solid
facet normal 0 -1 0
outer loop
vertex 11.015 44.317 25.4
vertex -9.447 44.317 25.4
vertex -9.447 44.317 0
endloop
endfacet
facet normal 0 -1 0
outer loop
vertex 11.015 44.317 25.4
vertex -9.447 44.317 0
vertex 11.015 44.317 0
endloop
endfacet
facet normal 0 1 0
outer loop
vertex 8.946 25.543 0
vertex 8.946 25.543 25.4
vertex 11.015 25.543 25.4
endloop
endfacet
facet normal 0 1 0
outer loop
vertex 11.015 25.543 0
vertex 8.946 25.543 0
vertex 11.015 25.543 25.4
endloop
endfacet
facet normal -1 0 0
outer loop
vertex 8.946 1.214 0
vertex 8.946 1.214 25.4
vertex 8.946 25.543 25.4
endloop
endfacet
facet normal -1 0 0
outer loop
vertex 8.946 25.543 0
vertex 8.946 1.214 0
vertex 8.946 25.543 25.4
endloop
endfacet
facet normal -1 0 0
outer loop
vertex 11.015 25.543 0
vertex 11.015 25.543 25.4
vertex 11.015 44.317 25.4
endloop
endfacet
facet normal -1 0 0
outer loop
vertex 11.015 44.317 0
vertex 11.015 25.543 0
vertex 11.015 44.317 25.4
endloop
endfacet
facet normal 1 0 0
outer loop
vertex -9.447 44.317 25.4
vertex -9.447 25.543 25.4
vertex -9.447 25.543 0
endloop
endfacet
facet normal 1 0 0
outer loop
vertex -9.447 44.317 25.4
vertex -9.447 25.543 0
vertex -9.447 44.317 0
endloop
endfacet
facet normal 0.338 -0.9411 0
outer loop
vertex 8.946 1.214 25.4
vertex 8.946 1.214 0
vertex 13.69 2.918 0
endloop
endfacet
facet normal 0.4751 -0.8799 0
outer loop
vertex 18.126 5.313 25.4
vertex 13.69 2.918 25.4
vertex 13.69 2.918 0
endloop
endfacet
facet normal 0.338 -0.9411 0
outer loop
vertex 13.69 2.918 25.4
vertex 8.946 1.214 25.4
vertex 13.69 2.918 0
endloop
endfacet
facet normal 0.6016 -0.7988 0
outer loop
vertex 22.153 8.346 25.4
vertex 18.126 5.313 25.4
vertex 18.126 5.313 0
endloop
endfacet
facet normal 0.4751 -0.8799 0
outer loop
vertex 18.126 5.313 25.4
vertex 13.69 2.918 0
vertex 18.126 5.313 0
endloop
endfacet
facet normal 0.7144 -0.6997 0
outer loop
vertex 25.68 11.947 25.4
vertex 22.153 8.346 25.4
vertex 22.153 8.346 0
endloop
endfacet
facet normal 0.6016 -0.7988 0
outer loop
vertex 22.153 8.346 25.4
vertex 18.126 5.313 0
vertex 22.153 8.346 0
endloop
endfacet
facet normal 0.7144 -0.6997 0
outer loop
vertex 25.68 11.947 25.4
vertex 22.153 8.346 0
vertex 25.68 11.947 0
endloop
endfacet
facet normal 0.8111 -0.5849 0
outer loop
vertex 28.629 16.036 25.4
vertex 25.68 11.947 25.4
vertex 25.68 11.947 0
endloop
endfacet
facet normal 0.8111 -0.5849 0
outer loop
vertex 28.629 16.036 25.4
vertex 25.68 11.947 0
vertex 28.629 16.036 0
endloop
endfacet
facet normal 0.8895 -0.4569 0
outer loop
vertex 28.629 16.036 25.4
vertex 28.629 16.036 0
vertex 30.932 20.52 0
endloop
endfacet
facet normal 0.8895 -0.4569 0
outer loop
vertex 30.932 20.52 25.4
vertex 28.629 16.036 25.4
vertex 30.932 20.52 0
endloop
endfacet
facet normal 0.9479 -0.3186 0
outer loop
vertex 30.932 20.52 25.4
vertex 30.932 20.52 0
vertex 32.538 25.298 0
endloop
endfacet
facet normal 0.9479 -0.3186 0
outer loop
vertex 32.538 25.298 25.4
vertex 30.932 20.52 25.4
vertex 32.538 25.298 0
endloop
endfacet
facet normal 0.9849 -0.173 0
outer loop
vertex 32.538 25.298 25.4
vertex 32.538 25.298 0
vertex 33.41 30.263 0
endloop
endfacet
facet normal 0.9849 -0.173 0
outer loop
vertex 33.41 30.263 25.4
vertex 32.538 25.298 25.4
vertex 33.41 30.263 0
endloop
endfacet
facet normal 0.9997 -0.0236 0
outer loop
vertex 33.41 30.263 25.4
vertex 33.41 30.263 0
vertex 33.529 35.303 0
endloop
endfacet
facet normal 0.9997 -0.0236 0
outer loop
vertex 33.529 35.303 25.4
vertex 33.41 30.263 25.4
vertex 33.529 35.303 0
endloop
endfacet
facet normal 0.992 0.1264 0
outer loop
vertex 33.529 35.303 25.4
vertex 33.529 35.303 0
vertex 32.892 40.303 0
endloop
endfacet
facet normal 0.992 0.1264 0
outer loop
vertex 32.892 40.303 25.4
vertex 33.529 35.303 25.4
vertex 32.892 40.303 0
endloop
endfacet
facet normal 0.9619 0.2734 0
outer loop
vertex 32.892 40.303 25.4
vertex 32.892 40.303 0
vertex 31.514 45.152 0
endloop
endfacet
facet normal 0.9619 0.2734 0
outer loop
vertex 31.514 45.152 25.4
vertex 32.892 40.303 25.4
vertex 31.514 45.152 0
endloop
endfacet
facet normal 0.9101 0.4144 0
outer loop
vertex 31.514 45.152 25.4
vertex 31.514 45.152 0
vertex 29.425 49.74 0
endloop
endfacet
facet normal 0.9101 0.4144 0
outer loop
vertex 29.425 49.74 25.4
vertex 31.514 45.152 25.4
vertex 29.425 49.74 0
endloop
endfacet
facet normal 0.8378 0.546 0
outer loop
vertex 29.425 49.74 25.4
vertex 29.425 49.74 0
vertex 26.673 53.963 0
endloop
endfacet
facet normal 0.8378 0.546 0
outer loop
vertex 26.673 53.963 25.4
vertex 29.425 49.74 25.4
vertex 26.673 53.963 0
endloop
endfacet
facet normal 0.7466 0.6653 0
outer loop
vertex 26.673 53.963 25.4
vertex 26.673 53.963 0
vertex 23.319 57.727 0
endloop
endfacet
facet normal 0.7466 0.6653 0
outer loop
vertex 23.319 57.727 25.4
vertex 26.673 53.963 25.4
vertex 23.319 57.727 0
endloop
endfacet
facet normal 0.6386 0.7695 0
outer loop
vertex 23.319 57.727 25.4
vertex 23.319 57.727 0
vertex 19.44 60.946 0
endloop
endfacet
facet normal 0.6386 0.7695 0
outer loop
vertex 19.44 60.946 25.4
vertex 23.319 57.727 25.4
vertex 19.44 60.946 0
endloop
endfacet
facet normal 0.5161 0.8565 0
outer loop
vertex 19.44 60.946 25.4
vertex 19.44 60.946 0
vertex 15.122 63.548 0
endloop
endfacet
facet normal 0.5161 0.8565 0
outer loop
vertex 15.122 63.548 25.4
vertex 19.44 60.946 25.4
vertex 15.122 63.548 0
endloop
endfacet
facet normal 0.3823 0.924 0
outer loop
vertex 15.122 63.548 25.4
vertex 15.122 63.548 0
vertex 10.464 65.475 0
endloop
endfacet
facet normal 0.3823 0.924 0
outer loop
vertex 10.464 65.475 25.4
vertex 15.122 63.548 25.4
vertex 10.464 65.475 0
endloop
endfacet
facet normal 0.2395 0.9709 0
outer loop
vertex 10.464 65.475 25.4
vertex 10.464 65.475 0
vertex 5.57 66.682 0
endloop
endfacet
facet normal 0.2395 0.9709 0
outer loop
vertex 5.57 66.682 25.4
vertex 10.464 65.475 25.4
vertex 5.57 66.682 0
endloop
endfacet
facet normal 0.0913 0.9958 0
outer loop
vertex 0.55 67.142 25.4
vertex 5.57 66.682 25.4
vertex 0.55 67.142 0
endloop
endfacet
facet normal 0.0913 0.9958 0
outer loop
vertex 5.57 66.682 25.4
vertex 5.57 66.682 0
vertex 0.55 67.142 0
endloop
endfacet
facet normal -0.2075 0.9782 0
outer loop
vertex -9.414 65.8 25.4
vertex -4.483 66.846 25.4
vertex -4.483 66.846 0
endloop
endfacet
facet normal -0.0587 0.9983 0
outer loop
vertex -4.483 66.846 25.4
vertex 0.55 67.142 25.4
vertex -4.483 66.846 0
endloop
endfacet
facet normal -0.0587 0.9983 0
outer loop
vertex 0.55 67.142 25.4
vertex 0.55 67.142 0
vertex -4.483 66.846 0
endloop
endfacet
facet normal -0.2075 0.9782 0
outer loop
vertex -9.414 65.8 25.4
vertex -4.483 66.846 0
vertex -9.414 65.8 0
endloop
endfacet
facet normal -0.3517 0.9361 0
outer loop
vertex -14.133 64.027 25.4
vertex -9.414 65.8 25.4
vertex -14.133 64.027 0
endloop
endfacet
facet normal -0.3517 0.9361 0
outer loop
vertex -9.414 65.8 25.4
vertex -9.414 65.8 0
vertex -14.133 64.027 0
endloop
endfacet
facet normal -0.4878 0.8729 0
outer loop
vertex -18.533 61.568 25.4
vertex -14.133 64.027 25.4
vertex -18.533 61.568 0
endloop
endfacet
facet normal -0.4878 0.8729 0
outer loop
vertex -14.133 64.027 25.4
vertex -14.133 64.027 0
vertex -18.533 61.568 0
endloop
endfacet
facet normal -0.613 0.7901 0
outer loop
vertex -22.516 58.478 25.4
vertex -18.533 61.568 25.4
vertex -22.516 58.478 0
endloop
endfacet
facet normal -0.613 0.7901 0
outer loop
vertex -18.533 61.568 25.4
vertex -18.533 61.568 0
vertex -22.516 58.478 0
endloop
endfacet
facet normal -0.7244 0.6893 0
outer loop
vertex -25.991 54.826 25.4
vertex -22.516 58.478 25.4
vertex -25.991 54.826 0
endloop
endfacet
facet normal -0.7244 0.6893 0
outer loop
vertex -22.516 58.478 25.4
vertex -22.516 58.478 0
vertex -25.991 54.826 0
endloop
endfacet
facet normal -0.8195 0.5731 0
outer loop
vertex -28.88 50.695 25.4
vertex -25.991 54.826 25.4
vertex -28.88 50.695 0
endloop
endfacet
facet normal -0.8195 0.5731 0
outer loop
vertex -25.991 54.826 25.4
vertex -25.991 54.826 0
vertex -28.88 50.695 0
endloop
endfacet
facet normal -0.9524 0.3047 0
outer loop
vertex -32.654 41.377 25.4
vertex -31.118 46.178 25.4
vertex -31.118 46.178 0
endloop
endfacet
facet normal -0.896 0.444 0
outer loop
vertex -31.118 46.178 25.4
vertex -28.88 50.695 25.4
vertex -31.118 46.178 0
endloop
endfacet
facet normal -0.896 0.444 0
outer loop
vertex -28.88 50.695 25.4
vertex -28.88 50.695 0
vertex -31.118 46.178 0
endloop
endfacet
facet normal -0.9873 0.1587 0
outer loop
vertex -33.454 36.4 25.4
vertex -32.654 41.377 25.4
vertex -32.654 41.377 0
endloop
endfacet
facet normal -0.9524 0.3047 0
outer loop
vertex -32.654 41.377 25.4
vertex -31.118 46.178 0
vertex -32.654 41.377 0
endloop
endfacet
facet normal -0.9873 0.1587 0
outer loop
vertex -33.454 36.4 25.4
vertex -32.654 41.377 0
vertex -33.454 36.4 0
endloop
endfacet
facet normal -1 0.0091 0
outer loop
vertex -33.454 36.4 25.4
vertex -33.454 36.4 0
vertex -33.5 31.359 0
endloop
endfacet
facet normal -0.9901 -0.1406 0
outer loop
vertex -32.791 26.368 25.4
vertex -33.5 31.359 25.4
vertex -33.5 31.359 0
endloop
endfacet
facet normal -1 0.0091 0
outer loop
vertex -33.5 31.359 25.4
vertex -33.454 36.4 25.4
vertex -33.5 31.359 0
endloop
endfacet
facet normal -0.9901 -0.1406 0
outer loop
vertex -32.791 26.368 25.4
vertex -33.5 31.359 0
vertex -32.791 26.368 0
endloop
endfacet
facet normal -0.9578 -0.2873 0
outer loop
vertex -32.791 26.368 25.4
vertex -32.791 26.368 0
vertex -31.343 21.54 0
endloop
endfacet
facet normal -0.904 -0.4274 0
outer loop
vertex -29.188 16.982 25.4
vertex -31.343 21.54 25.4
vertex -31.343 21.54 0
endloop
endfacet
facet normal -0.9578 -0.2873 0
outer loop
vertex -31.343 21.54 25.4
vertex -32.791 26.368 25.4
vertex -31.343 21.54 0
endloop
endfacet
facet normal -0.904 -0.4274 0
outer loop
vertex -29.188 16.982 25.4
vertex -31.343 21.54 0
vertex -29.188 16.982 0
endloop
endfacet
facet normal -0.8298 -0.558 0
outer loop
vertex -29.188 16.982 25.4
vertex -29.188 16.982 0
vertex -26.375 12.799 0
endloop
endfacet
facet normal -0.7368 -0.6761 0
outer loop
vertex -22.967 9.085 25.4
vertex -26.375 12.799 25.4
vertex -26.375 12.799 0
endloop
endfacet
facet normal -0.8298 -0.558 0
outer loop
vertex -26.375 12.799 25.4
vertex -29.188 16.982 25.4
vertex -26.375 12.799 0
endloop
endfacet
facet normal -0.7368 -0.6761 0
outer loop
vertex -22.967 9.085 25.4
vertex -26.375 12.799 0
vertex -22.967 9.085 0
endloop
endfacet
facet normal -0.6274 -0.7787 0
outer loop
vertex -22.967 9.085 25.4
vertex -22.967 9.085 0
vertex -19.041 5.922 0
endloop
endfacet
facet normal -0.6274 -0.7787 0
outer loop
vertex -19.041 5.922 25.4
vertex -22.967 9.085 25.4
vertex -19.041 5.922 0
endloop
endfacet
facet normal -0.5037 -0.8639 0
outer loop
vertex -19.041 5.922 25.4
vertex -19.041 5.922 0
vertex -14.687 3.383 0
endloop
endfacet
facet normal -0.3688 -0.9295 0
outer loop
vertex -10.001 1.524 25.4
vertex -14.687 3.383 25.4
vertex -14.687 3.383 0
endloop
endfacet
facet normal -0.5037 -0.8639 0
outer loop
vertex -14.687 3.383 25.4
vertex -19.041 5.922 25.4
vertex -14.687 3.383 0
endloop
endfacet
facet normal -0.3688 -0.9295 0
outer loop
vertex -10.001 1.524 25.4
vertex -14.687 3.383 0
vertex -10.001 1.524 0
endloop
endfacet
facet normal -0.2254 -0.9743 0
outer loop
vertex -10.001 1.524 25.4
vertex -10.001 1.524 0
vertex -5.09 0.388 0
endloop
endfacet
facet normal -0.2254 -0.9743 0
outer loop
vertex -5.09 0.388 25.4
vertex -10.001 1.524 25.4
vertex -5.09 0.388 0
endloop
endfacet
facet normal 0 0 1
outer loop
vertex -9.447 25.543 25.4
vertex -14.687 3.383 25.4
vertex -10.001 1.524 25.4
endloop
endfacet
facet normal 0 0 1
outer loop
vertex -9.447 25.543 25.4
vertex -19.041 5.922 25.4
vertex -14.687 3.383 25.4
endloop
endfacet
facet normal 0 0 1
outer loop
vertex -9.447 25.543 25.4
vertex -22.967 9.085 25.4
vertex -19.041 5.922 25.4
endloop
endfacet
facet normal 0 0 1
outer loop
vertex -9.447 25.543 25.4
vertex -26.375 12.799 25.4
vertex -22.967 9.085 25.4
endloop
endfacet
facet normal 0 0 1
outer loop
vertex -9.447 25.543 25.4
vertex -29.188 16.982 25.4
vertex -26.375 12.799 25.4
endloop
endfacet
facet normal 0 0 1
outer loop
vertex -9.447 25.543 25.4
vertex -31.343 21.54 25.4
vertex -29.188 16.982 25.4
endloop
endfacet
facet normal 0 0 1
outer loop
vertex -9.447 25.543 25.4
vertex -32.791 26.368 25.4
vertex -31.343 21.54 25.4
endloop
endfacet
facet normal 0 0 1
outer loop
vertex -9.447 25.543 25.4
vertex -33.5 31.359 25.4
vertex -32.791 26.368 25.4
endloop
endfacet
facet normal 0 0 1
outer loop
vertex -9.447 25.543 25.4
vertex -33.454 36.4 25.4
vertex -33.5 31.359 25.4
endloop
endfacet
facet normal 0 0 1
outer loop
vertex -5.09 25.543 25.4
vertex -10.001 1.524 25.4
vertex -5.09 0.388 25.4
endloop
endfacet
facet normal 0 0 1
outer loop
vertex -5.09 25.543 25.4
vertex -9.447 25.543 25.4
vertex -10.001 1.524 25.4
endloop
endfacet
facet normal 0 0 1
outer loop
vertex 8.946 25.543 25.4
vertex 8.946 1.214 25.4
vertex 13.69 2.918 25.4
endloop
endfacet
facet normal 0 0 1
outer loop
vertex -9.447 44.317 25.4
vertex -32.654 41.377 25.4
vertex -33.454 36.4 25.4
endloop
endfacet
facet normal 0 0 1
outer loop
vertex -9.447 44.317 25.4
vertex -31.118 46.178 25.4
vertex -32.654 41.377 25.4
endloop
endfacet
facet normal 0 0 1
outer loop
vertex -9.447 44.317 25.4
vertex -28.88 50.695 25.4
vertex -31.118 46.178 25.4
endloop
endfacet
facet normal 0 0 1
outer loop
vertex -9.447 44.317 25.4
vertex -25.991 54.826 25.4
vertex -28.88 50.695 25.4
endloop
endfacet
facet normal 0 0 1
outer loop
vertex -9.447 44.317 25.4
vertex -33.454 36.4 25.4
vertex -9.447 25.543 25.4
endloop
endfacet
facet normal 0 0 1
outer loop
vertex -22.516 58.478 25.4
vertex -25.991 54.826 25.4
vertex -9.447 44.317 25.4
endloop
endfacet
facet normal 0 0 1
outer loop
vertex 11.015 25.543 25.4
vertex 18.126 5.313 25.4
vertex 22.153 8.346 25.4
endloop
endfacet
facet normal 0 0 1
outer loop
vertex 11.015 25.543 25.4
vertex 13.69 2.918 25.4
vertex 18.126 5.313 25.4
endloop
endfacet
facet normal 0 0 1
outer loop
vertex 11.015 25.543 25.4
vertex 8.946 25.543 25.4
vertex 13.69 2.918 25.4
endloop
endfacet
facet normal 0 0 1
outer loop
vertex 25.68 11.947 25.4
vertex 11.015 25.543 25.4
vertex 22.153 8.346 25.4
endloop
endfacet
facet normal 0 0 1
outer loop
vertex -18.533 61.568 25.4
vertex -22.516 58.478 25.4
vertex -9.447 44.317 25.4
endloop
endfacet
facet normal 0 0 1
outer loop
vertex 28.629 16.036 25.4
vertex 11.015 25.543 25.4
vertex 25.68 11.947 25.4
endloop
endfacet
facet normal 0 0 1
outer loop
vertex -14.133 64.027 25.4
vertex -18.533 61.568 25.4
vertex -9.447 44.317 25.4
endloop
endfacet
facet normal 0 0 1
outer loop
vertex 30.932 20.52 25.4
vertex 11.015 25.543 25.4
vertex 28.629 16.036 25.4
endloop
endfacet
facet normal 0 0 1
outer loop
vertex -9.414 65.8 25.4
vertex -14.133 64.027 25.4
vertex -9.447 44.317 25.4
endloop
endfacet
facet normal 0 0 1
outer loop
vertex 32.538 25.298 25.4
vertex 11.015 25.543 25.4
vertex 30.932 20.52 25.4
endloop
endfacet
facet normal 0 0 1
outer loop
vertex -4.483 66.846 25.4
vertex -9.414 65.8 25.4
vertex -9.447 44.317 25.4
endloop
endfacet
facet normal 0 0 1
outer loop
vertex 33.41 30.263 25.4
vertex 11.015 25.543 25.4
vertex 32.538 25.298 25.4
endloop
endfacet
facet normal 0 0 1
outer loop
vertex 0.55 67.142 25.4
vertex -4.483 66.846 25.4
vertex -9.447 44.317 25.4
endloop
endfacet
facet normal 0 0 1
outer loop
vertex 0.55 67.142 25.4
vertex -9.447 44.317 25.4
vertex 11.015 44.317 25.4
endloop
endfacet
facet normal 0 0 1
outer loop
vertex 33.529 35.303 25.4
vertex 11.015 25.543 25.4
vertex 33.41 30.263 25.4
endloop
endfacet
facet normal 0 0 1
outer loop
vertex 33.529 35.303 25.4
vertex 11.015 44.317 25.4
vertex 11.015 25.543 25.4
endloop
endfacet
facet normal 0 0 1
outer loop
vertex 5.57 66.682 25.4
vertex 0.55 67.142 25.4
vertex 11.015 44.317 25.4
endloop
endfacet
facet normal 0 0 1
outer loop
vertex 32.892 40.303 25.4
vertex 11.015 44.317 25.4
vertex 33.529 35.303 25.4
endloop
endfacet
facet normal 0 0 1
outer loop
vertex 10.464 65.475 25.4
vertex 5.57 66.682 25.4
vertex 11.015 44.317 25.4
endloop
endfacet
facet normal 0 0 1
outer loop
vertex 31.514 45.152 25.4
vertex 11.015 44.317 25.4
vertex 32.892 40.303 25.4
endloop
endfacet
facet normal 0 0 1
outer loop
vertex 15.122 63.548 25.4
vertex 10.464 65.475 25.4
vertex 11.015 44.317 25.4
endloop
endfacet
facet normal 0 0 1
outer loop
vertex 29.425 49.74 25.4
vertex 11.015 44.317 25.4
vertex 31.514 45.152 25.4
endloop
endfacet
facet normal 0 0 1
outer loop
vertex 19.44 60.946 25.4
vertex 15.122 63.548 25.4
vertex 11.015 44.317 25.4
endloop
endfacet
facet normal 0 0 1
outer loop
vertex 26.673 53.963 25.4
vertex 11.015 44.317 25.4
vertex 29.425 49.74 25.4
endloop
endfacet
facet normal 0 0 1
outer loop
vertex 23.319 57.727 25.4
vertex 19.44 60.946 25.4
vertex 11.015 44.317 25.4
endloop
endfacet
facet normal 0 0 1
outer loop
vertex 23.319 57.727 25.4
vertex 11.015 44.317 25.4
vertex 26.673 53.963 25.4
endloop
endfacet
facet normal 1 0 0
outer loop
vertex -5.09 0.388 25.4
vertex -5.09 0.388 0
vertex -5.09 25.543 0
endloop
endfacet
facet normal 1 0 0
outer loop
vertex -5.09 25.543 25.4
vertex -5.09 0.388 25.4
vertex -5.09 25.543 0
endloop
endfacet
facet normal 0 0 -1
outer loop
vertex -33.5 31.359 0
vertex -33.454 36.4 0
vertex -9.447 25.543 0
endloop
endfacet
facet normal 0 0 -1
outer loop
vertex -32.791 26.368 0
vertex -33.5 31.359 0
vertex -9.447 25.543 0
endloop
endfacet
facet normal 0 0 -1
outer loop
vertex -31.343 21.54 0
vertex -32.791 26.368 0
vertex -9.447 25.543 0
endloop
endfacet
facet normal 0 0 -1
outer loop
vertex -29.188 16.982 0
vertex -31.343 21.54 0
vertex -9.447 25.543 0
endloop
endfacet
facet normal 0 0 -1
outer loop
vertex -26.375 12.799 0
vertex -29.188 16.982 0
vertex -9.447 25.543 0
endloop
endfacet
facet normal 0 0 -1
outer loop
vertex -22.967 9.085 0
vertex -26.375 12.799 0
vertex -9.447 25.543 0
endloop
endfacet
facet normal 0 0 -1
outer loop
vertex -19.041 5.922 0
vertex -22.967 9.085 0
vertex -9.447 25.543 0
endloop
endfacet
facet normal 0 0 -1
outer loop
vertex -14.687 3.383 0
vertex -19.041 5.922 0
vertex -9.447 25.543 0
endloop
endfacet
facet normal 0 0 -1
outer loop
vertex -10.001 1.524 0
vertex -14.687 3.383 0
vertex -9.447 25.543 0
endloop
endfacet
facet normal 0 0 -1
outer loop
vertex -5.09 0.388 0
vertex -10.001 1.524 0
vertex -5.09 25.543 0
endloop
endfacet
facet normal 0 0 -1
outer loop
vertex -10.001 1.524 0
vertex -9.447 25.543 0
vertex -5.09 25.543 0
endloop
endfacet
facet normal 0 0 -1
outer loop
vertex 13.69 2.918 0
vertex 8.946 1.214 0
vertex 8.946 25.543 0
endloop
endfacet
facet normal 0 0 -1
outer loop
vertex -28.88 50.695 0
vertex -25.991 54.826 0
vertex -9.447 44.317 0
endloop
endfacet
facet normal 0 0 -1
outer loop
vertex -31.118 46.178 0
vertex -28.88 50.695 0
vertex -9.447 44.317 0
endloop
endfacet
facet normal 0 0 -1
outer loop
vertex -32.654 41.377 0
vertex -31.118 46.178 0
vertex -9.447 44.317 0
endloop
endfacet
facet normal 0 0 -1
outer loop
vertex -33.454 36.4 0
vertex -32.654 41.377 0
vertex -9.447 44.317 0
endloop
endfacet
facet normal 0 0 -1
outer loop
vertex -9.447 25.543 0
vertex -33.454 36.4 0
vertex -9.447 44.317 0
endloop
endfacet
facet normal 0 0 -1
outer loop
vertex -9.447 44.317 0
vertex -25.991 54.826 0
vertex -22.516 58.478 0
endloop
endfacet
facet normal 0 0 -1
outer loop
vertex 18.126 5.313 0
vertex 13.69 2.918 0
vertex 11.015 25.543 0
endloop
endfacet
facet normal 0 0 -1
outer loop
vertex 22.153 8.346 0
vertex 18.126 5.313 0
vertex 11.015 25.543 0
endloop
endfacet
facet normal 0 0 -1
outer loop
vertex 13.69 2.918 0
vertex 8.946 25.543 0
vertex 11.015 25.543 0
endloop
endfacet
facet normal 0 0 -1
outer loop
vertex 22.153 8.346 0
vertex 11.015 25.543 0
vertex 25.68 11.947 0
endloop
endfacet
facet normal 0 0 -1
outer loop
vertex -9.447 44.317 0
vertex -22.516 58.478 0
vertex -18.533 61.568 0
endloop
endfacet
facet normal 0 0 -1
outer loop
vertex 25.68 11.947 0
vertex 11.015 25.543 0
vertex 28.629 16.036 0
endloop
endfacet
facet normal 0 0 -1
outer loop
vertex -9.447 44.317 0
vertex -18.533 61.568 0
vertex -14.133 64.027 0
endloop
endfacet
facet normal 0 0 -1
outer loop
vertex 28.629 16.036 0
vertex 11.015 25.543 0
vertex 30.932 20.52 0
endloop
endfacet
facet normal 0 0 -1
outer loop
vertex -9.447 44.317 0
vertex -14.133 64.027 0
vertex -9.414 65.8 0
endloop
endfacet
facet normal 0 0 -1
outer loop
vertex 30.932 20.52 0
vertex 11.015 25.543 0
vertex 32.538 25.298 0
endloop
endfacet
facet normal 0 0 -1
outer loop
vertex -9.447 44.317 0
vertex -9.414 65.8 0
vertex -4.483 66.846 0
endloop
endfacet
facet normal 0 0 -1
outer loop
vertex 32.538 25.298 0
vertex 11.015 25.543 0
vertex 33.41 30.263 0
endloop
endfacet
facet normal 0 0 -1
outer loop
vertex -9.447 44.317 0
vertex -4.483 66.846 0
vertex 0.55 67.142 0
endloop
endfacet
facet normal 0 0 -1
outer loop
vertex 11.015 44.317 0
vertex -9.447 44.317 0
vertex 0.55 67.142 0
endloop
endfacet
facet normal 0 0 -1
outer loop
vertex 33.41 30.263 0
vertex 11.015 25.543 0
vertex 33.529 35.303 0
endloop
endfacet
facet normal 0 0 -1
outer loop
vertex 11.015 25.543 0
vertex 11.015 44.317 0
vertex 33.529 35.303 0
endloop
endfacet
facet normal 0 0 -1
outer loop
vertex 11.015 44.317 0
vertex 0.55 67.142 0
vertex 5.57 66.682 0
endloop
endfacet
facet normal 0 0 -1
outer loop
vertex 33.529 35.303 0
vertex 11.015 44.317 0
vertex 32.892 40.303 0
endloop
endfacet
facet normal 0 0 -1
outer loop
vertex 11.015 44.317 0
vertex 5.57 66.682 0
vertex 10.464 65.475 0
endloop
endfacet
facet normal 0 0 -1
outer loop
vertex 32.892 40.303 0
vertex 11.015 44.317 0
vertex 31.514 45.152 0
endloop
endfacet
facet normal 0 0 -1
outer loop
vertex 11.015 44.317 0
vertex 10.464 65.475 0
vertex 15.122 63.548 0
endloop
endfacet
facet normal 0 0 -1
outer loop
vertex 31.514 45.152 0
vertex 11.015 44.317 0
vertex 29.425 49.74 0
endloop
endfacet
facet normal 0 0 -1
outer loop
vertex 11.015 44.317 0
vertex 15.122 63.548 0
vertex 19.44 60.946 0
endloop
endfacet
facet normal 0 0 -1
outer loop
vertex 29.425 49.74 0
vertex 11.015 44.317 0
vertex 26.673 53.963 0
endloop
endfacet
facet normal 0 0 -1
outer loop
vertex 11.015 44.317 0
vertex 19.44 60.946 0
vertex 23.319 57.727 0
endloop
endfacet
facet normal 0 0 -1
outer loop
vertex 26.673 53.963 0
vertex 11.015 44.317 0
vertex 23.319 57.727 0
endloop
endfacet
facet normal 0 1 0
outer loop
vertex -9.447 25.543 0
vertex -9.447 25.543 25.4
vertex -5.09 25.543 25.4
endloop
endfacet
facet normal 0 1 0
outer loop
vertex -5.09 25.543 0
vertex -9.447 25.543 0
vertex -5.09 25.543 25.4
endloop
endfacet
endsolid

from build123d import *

# Parameters (mm, degrees)
F0_R     = 33.573471
F1_DEPTH = 25.4
F2_W     = 30.792393
F2_H     = 28.740146
F3_DEPTH = 25.4
F5_W     = 20.462201
F5_H     = 18.77485
F6_DEPTH = 25.4
F7_W     = 14.035523
F7_H     = 30.486682
F8_DEPTH = 25.4


with BuildPart() as f1:
    # F0 (on Top) → F1 (new body)
    with BuildSketch(Plane.XY):
        with Locations((0, 33.573471)):
            Circle(F0_R)
    extrude(amount=F1_DEPTH)

    # F5 (on face) → F6 (cut)
    with BuildSketch(Plane.XY.offset(25.4)):
        with Locations((0.784219, 34.929999)):
            Rectangle(F5_W, F5_H)
    extrude(amount=-F6_DEPTH, mode=Mode.SUBTRACT)

    # F7 (on face) → F8 (cut)
    with BuildSketch(Plane.XY.offset(25.4)):
        with Locations((1.928251, 10.299233)):
            Rectangle(F7_W, F7_H)
    extrude(amount=-F8_DEPTH, mode=Mode.SUBTRACT)


with BuildPart() as f3:
    # F2 (on Top) → F3 (new body)
    with BuildSketch(Plane.XY):
        with Locations((-49.557659, -41.295018)):
            Rectangle(F2_W, F2_H)
    extrude(amount=F3_DEPTH)


solid = f1.part
